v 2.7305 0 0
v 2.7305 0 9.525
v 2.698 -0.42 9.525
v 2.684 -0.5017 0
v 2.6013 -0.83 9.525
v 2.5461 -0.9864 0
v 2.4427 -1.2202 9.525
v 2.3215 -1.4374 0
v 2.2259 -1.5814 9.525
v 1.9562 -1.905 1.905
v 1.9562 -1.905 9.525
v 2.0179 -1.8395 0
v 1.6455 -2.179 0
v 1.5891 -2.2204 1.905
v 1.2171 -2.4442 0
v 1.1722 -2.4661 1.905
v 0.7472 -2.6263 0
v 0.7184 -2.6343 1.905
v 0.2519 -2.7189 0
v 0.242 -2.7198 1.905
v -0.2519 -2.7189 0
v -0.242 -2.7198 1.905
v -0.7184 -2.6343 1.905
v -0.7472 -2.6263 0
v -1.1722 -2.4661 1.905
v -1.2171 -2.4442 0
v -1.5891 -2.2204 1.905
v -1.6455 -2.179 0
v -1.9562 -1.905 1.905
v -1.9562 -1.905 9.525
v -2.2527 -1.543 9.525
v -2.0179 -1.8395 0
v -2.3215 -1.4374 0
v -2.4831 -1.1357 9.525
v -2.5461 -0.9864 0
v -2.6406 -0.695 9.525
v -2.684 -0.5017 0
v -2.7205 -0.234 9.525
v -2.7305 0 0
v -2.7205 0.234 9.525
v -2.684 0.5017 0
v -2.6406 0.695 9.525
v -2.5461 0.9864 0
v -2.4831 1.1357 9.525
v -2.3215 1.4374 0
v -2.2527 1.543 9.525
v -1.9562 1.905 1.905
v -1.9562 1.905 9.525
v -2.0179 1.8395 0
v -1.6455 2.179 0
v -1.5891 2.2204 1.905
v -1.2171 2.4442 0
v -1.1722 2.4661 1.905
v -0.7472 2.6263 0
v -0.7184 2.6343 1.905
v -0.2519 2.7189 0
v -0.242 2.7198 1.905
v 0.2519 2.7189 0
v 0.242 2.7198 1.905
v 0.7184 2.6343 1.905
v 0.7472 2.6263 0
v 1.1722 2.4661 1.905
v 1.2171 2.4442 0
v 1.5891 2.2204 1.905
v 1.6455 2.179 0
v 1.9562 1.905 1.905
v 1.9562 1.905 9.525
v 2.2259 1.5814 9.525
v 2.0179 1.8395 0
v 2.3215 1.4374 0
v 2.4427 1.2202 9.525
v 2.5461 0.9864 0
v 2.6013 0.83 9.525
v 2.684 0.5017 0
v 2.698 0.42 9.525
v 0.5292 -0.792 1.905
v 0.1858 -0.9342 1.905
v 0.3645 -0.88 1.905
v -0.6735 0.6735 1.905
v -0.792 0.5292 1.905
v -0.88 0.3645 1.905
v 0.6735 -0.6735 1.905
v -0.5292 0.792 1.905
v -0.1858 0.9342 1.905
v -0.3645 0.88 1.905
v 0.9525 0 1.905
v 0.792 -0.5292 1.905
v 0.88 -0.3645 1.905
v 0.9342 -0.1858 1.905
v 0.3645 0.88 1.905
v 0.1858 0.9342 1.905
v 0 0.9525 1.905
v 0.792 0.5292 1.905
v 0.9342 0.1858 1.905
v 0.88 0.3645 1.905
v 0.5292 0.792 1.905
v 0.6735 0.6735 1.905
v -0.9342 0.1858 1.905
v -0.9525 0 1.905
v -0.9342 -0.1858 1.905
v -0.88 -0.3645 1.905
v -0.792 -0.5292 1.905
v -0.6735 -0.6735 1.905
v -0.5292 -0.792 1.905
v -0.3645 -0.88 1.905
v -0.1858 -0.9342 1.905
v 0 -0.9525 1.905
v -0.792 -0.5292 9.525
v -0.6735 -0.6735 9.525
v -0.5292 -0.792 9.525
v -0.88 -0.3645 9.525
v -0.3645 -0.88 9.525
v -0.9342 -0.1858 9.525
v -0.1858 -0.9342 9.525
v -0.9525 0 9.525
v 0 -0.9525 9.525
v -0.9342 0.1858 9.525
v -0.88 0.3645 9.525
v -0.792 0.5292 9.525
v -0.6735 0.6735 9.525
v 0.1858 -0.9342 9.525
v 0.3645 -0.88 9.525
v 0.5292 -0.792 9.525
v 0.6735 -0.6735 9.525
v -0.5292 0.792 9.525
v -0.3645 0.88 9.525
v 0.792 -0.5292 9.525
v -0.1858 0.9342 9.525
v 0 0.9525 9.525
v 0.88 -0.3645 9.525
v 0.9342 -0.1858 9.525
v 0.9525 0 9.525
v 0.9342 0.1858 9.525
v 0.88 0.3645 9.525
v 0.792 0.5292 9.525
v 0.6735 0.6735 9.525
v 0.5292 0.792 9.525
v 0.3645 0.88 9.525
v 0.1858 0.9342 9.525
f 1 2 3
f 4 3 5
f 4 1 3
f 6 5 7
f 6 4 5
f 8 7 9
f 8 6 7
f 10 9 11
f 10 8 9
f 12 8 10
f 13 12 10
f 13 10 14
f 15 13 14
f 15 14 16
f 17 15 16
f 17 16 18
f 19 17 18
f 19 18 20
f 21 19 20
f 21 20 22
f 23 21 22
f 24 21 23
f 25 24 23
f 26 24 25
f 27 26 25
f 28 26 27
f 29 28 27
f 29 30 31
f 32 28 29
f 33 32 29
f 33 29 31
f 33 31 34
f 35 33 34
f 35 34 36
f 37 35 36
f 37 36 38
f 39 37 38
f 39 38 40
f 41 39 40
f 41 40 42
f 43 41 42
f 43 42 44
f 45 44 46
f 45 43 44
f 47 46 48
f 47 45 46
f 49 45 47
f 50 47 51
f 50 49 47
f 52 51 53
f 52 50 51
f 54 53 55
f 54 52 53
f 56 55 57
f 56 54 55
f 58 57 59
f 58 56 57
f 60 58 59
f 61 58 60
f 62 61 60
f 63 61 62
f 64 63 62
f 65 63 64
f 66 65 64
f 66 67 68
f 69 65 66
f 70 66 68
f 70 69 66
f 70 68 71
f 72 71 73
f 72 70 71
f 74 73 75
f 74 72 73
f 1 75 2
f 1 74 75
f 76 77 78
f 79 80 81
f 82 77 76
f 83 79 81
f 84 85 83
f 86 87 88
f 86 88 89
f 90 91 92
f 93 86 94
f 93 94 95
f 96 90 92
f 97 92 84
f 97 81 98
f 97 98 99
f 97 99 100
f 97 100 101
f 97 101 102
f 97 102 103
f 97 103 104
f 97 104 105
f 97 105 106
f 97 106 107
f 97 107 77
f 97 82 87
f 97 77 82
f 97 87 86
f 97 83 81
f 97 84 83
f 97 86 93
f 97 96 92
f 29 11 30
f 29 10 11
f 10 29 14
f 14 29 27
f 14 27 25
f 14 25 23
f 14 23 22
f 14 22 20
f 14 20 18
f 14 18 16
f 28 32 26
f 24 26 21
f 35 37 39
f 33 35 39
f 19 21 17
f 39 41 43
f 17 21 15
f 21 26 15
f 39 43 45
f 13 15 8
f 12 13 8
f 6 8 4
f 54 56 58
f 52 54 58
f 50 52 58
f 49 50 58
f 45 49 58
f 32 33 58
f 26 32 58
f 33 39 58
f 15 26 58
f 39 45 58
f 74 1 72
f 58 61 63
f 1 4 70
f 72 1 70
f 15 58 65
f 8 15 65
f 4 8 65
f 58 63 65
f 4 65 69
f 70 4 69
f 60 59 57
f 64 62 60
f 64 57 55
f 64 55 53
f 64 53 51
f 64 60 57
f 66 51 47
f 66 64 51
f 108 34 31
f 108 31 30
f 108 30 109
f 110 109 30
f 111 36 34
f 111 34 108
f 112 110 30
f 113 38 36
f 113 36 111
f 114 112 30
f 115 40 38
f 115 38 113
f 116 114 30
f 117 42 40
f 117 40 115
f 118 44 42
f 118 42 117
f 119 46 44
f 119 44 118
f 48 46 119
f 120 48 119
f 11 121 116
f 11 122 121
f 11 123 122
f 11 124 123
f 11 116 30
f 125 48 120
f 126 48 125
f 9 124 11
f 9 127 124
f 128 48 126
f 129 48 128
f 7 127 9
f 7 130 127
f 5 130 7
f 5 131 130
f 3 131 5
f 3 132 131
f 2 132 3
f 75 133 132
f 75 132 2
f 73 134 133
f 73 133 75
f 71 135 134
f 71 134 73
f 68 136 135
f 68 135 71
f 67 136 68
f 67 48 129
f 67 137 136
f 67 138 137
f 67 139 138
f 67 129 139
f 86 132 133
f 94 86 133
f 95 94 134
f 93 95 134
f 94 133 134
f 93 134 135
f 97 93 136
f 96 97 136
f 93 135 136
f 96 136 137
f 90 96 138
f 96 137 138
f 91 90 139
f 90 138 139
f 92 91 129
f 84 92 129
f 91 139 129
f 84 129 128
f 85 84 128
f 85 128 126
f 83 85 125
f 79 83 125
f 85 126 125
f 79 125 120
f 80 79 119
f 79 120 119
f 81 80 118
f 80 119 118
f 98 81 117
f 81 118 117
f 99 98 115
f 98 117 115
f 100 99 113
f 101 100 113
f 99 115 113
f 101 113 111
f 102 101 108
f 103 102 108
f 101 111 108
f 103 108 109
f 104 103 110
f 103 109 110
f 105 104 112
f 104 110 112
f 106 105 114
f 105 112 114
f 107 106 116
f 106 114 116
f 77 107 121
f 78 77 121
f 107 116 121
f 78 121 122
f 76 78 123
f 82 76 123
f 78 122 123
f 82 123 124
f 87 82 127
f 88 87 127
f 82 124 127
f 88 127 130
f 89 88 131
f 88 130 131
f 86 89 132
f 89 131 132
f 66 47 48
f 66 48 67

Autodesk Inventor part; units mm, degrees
ref_plane "YZ Plane" through (0, 0, 0) normal (1, 0, 0) x (0, 1, 0)
ref_plane "XZ Plane" through (0, 0, 0) normal (0, 1, 0) x (-1, 0, 0)
ref_plane "XY Plane" through (0, 0, 0) normal (0, 0, 1) x (1, 0, 0)
sketch "Sketch1" plane through (0, 0, 0) normal (0, 0, 1) x (1, 0, 0)
  circle A0 centre (0, 0) radius 2.7305
  dimension "d0" = 5.461
extrude "Extrusion1" add sketch "Sketch1" along normal blind 1.905
sketch "Sketch2" plane through (0, 0, 1.905) normal (0, 0, 1) x (1, 0, 0)
  circle A0 centre (0, 0) radius 2.7305 projected
  line L0 (-1.9562, 1.905) -> (1.9562, 1.905)
  line L1 (1.9562, -1.905) -> (-1.9562, -1.905)
  arc A1 (-1.9562, 1.905) -> (-1.9562, -1.905) centre (0, 0) ccw
  arc A2 (1.9562, -1.905) -> (1.9562, 1.905) centre (0, 0) ccw
  point P0 (0, 1.905)
  point P1 (0, -1.905)
  dimension "d3" = 1.905
  dimension "d4" = 1.905
extrude "Extrusion2" add sketch "Sketch2" along normal blind 7.62 contours A0 L1 L0
sketch "Sketch3" plane through (0, 0, 9.525) normal (0, 0, 1) x (1, 0, 0)
  circle A0 centre (0, 0) radius 2.7305 projected
  circle A1 centre (0, 0) radius 0.9525
  dimension "d7" = 1.905
extrude "Extrusion3" cut sketch "Sketch3" against normal blind 7.62 contours A1
properties part number "MotorShaft" material "ABS Plastic"
